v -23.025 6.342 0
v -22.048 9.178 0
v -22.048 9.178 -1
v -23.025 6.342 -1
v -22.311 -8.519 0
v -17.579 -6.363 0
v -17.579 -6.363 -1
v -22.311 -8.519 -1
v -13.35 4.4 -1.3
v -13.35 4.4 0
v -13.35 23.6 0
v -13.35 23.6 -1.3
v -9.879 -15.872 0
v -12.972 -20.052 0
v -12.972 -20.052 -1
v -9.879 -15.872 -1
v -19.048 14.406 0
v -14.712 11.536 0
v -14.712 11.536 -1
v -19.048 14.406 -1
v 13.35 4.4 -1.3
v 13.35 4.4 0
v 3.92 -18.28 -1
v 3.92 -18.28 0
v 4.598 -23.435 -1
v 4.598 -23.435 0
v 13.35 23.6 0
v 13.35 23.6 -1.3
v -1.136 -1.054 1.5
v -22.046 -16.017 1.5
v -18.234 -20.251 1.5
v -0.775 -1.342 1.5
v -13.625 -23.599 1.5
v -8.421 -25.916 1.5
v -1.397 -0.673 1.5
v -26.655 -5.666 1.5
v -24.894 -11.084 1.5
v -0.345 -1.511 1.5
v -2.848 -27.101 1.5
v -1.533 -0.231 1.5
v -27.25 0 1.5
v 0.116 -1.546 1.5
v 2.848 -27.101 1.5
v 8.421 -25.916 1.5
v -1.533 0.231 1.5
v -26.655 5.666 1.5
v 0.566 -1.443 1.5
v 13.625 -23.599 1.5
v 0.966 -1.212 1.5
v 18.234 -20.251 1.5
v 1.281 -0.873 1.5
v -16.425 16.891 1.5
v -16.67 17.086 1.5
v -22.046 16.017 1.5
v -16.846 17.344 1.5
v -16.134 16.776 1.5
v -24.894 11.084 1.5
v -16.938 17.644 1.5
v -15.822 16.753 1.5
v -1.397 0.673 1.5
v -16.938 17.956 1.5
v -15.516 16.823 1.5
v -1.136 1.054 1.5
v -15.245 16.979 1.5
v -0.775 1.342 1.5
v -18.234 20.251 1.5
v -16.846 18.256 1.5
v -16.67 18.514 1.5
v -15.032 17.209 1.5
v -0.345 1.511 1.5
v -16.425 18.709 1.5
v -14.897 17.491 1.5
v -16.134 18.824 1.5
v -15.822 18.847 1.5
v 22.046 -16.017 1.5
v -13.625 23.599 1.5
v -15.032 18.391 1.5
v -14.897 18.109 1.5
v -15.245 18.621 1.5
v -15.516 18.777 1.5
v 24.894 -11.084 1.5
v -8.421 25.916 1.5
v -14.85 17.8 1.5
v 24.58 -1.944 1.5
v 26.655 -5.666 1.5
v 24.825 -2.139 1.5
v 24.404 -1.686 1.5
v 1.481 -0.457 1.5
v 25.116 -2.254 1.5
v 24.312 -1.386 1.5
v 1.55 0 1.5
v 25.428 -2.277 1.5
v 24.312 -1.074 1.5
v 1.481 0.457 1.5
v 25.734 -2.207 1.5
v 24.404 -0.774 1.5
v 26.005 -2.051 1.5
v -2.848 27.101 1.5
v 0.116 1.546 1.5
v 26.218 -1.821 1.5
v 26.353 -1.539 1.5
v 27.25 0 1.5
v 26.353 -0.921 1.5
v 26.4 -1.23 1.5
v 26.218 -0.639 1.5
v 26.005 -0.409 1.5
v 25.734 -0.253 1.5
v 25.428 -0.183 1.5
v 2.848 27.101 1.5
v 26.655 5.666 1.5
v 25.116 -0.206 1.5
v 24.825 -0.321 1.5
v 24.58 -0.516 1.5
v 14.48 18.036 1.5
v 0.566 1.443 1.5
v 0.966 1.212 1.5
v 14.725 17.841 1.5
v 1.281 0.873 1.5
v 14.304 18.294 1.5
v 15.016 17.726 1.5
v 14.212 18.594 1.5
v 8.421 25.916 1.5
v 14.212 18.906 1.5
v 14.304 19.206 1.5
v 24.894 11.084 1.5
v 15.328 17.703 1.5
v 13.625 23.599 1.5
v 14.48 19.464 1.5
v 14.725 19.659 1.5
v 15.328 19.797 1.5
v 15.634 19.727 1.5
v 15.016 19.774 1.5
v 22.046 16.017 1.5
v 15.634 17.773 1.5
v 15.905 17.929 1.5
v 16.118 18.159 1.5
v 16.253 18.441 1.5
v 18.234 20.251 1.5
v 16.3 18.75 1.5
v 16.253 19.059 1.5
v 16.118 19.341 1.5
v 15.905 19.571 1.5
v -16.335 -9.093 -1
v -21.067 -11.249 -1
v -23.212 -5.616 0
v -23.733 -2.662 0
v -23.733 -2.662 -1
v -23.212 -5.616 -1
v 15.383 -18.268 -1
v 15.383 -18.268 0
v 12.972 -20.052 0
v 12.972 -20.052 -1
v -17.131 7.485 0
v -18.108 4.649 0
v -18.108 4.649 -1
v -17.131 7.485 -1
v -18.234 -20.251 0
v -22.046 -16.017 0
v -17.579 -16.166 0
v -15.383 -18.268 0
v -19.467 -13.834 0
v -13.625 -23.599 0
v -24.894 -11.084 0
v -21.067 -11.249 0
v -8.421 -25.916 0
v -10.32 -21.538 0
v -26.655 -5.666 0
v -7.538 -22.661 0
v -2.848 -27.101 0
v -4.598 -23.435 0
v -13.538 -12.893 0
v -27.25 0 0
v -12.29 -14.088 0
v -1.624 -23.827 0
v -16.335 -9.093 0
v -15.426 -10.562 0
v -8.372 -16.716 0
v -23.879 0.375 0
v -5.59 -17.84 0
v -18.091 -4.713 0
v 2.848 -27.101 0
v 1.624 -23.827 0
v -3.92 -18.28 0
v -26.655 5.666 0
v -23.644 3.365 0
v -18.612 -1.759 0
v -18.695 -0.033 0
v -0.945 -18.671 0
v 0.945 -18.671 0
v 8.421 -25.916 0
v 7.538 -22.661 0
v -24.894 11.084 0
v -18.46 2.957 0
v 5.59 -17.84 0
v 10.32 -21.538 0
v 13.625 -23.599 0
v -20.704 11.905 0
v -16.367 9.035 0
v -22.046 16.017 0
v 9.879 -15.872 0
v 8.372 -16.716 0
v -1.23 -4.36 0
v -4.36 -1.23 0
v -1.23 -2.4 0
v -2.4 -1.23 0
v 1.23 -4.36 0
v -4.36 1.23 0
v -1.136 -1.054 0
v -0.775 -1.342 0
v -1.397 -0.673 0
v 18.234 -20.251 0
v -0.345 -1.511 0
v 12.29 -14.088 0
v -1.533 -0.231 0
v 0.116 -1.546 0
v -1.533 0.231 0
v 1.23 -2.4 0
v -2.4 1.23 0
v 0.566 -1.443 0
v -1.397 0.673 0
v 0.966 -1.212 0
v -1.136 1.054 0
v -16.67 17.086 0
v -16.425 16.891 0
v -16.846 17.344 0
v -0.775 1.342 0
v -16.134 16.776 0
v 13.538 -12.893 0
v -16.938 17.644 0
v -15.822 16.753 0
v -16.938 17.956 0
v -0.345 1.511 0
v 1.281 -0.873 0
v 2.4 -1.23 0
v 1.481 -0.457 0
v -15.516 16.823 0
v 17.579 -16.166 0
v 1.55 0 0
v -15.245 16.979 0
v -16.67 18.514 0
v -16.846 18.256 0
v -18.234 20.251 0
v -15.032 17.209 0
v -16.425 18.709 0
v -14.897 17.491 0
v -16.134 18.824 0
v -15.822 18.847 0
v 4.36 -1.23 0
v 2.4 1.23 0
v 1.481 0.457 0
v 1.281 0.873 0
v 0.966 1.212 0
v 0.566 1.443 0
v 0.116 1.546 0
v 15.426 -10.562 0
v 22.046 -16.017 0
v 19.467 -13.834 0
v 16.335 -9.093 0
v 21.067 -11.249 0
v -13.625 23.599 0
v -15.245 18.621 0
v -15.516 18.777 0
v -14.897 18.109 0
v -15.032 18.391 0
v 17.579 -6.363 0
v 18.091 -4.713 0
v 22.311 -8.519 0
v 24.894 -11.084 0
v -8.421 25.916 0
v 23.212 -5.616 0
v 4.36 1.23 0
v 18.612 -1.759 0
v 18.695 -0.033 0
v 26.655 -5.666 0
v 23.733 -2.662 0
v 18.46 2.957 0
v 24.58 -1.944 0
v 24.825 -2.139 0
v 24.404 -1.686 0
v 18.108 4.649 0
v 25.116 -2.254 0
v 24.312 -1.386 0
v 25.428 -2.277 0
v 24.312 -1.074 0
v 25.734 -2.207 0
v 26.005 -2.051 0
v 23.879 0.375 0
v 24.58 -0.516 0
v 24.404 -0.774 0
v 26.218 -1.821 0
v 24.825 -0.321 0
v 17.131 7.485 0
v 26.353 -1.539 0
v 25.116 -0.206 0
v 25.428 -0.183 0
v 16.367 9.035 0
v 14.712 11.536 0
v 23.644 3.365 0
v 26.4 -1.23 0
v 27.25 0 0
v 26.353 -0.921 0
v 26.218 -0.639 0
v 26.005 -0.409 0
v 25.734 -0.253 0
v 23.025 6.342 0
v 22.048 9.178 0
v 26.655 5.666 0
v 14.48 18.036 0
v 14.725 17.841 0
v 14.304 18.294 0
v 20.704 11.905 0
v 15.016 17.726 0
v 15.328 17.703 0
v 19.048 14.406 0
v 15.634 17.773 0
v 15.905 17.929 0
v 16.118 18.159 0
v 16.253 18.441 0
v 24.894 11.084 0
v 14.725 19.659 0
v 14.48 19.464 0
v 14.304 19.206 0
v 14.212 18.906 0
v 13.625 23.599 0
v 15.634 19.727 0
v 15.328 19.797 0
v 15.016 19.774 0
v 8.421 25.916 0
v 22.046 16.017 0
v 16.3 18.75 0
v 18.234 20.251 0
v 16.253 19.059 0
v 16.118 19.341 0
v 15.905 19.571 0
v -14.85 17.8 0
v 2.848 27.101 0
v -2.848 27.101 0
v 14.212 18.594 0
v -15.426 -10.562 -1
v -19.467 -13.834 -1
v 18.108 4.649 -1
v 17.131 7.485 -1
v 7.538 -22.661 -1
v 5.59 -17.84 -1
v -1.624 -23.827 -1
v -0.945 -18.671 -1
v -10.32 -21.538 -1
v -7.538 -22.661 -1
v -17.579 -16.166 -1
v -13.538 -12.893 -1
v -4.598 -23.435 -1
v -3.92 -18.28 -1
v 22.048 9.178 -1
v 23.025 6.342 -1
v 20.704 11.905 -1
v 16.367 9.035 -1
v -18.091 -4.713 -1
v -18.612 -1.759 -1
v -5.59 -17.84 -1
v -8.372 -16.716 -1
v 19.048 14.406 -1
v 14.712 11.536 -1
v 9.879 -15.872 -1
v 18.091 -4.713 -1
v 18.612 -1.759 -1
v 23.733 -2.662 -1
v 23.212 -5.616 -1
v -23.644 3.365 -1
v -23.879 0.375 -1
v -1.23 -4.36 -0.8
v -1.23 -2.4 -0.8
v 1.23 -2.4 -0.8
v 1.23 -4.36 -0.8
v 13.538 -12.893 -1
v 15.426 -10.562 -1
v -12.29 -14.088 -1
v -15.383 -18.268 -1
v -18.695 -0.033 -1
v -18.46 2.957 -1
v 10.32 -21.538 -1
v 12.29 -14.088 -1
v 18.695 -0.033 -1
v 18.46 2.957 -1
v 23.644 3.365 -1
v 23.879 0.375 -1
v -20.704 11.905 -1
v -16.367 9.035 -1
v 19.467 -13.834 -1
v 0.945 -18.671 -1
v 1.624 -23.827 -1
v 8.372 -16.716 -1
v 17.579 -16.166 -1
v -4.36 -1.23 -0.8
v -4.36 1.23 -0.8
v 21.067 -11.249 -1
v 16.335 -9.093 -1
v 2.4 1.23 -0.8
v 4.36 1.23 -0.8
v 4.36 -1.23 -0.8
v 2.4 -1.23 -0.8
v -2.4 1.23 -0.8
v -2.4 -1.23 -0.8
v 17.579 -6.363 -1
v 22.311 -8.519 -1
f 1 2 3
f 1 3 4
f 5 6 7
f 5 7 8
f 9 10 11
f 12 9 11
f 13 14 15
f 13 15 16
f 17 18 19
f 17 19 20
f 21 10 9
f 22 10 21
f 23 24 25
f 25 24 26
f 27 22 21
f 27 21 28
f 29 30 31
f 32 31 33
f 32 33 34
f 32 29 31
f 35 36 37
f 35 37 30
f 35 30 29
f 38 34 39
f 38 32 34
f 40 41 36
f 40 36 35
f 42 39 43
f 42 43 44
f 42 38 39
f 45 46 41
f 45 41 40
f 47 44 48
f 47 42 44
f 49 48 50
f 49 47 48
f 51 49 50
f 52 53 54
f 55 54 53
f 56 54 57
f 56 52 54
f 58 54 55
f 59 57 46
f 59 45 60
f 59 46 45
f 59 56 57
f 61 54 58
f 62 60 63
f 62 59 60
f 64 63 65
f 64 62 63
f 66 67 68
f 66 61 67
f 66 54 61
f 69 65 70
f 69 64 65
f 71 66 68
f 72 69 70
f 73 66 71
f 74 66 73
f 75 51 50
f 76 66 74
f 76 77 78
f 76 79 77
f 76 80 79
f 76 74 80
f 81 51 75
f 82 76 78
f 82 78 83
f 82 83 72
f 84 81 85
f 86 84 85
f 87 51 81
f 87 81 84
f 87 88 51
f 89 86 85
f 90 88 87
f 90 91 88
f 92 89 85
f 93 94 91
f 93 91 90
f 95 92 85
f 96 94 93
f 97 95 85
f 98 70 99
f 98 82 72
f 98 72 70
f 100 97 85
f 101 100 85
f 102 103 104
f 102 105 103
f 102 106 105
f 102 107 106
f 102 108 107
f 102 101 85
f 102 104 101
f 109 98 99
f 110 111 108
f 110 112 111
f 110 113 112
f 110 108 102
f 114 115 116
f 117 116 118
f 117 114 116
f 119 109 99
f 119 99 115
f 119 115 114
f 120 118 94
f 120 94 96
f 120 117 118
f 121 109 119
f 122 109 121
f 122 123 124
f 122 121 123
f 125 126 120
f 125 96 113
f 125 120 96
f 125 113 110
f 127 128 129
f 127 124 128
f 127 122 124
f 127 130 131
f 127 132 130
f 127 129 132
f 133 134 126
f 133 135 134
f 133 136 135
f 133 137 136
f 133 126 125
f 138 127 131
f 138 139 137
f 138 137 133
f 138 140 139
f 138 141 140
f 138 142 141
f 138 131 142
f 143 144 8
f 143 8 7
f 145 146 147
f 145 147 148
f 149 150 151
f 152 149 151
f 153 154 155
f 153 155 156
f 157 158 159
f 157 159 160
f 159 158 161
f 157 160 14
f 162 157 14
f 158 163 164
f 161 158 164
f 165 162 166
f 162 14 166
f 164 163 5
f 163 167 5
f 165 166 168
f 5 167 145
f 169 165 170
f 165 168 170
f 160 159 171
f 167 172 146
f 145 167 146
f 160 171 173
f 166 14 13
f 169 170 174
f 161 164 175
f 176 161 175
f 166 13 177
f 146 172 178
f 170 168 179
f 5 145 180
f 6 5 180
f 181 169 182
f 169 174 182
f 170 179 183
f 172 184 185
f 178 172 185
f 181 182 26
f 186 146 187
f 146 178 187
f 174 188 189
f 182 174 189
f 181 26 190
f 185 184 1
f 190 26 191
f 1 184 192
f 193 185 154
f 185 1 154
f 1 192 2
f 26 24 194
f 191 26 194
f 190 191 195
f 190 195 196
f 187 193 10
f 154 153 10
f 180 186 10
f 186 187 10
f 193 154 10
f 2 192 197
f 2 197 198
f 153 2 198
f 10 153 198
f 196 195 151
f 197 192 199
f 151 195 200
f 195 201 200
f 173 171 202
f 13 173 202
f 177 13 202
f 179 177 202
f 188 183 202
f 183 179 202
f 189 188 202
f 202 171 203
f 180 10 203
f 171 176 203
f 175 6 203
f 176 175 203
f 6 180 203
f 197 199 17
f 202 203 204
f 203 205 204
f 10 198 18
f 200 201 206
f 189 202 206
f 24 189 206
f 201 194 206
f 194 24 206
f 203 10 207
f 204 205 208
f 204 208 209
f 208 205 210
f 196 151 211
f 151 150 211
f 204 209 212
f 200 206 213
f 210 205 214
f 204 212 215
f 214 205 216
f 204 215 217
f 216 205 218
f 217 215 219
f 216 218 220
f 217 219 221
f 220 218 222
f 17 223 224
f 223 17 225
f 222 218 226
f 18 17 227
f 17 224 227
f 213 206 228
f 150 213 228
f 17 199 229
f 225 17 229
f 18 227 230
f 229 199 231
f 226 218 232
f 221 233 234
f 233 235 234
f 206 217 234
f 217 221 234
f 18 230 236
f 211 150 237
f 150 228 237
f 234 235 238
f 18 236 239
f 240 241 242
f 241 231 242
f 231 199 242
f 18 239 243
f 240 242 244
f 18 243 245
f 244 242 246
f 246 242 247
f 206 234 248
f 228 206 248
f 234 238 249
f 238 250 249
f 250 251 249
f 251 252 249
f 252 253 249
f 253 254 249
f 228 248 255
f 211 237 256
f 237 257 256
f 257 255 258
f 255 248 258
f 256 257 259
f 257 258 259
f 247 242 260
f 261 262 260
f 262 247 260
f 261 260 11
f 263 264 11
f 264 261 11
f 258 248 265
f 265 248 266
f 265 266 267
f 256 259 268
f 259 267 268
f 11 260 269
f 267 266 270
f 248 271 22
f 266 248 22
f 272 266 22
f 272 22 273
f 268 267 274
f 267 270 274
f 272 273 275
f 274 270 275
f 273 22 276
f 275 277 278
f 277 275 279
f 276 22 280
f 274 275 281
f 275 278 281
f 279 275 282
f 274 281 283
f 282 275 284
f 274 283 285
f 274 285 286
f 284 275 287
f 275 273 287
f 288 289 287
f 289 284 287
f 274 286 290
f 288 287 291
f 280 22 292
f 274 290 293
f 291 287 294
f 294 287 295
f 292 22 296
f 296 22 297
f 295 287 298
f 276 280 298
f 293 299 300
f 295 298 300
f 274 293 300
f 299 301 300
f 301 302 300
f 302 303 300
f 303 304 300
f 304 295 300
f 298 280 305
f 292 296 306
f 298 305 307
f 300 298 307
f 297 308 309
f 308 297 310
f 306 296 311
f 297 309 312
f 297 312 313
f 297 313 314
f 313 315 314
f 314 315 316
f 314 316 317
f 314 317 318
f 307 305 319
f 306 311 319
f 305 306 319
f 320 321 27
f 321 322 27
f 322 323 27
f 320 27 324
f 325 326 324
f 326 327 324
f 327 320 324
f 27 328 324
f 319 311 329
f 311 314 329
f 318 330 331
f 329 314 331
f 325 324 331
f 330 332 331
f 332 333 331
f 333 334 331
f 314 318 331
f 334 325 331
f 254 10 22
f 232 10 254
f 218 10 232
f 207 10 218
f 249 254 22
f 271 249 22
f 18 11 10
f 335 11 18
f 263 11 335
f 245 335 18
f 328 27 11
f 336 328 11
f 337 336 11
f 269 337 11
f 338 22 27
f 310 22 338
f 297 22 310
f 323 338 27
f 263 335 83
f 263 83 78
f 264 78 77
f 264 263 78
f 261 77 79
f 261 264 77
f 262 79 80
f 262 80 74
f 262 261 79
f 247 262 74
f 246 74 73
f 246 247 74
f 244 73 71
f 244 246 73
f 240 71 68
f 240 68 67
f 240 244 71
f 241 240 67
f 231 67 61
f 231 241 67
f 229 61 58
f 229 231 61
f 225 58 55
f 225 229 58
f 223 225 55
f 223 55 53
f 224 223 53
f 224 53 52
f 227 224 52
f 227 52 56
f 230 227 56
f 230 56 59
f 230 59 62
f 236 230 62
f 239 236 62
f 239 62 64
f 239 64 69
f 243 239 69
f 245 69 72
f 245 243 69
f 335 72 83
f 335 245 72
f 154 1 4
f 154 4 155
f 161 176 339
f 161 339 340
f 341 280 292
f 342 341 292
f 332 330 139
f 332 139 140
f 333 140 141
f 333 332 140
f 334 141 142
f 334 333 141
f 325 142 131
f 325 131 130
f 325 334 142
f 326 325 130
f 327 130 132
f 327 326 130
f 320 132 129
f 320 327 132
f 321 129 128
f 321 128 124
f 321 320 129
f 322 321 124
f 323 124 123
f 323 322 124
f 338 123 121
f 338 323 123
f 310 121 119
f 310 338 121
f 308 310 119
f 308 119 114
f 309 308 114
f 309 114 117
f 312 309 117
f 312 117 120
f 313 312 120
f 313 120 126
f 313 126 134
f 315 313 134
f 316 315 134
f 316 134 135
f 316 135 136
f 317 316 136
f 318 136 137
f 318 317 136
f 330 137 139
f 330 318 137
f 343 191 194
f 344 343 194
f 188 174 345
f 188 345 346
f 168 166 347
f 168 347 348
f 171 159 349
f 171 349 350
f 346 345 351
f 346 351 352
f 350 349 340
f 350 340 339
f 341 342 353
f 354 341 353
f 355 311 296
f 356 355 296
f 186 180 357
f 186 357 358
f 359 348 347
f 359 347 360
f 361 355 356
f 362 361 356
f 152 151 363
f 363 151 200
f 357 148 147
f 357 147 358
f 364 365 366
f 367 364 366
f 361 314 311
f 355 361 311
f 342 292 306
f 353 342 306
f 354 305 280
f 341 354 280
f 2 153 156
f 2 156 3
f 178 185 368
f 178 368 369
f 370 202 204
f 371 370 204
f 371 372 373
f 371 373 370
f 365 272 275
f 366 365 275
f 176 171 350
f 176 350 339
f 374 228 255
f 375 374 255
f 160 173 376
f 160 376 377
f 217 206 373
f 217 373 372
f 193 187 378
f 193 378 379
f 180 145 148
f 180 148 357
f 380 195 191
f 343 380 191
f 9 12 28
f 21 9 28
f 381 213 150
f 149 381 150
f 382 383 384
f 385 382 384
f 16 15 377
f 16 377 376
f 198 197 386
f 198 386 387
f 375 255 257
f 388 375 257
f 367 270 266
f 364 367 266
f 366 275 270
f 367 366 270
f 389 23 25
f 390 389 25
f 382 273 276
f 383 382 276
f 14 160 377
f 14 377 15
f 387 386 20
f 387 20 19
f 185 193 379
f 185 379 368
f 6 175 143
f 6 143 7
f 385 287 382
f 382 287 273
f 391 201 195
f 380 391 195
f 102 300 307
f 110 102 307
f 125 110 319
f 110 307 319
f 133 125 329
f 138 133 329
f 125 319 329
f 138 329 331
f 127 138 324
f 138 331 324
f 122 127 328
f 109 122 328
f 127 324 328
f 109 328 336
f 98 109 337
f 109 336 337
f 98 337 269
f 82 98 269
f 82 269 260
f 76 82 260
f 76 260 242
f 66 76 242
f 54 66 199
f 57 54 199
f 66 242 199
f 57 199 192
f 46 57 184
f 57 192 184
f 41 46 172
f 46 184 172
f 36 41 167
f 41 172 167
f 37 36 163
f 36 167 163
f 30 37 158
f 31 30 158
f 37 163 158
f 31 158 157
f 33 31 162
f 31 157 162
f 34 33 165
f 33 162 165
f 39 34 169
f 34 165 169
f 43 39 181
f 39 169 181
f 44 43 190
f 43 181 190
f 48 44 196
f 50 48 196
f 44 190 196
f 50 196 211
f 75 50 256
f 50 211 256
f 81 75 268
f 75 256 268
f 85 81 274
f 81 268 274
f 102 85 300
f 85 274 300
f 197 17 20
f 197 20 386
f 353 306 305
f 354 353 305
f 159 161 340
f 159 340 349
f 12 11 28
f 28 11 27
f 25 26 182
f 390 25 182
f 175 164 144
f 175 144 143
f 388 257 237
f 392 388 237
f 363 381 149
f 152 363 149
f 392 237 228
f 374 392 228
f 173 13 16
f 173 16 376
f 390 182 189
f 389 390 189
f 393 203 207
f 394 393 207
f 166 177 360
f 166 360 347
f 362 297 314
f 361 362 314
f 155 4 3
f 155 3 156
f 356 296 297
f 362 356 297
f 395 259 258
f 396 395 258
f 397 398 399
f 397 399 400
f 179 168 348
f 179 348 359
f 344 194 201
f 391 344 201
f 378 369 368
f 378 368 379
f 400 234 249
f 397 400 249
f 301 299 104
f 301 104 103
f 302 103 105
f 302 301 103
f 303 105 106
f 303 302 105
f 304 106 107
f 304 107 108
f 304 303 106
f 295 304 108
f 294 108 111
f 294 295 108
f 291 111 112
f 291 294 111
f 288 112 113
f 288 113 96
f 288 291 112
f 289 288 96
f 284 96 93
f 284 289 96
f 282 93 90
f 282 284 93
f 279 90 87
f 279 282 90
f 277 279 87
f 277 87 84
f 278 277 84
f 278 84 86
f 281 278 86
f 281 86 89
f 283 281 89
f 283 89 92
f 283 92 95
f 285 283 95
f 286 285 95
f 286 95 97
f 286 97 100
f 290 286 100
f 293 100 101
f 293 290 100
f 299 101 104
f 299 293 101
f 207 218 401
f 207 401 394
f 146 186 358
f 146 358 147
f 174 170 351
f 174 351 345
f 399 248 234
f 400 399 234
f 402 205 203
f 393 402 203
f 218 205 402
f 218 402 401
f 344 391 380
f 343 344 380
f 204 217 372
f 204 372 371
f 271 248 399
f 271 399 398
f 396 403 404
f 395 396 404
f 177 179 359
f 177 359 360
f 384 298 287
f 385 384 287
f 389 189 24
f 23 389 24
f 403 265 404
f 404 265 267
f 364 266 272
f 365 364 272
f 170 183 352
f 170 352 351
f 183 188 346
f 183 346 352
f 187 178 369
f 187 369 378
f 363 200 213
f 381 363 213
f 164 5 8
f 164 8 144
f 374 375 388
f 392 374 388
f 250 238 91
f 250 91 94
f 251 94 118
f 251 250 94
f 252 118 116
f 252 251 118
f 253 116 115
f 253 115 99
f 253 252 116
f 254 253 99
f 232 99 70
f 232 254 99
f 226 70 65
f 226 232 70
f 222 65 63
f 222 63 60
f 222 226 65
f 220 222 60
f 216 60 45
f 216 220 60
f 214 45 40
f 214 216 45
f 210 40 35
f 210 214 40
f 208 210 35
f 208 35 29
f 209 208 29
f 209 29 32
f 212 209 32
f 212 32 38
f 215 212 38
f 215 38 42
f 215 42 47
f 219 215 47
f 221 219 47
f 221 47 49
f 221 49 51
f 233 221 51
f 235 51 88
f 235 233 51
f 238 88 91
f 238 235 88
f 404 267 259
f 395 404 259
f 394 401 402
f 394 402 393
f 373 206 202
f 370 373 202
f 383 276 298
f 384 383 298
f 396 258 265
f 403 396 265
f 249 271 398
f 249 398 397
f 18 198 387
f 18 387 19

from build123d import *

# Parameters (mm, degrees)
SKETCH_1_R           = 27.25
SKETCH_1_R_2         = 1.05
SKETCH_1_R_3         = 1.55
EXTRUDE_1_DEPTH      = 1.5
SKETCH_2_W           = 26.7
SKETCH_2_H           = 19.2
EXTRUDE_2_DEPTH      = 1.3
BOSS_EXTRUDE1_DEPTH  = 1
CIRPATTERN1_COUNT    = 9
CIRPATTERN1_ANGLE    = 116
SKETCH2_W            = 2.46
SKETCH2_H            = 1.96
SKETCH2_W_2          = 1.96
SKETCH2_H_2          = 2.46
BOSS_EXTRUDE2_DEPTH  = 0.8
MIRROR1_COPY_1_DEPTH = 1
MIRROR1_COPY_2_DEPTH = 1
MIRROR1_COPY_3_DEPTH = 1
MIRROR1_COPY_4_DEPTH = 1
MIRROR1_COPY_5_DEPTH = 1
MIRROR1_COPY_6_DEPTH = 1
MIRROR1_COPY_7_DEPTH = 1
MIRROR1_COPY_8_DEPTH = 1


with BuildPart() as part:
    # Эскиз1 → Бобышка-Вытянуть1 (new body)
    with BuildSketch(Plane.XY):
        Circle(SKETCH_1_R)
        with Locations((-15.9, 17.8)):
            Circle(SKETCH_1_R_2, mode=Mode.SUBTRACT)
        with Locations((15.25, 18.75)):
            Circle(SKETCH_1_R_2, mode=Mode.SUBTRACT)
        with Locations((25.35, -1.23)):
            Circle(SKETCH_1_R_2, mode=Mode.SUBTRACT)
        Circle(SKETCH_1_R_3, mode=Mode.SUBTRACT)
    extrude(amount=EXTRUDE_1_DEPTH)

    # Эскиз2 → Бобышка-Вытянуть2 (add)
    with BuildSketch(Plane.XY):
        with Locations((0, 14)):
            Rectangle(SKETCH_2_W, SKETCH_2_H)
    extrude(amount=-EXTRUDE_2_DEPTH)

    # Sketch1 → Boss-Extrude1 (add)
    with BuildSketch(Plane(origin=(0, 0, 0), x_dir=(-1, 0, 0), z_dir=(0, 0, -1))):
        Polygon((19.047763091, 14.406246778), (20.703574047, 11.904589312), (16.367367772, 9.034516988), (14.711556816, 11.536174454), align=None)
    boss_extrude1 = extrude(amount=BOSS_EXTRUDE1_DEPTH)

    # CirPattern1: Boss-Extrude1 ×9 about axis
    cirpattern1_axis = Axis((0, 0, 0), (0, 0, 1))
    for i in range(1, CIRPATTERN1_COUNT):
        add(boss_extrude1.rotate(cirpattern1_axis, i * CIRPATTERN1_ANGLE / (CIRPATTERN1_COUNT - 1)))

    # Sketch2 → Boss-Extrude2 (add)
    with BuildSketch(Plane(origin=(0, 0, 0), x_dir=(-1, 0, 0), z_dir=(0, 0, -1))):
        with Locations((0, -3.38)):
            Rectangle(SKETCH2_W, SKETCH2_H)
        with Locations((-3.38, 0)):
            Rectangle(SKETCH2_W_2, SKETCH2_H_2)
        with Locations((3.38, 0)):
            Rectangle(SKETCH2_W_2, SKETCH2_H_2)
    extrude(amount=BOSS_EXTRUDE2_DEPTH)

    # Mirror1: Boss-Extrude1 across plane
    add(boss_extrude1.mirror(Plane(origin=(0, 0, 0), x_dir=(0, 0, 1), z_dir=(1, 0, 0))))

    # Mirror1 copy 1 sketch → Mirror1 copy 1 (add)
    with BuildSketch(Plane(origin=(0, 0, 0), x_dir=(0.9681476403781076, -0.25038000405444194, 0), z_dir=(0, 0, -1))):
        Polygon((19.047763091, -14.406246778), (20.703574047, -11.904589312), (16.367367772, -9.034516988), (14.711556816, -11.536174454), align=None)
    extrude(amount=MIRROR1_COPY_1_DEPTH)

    # Mirror1 copy 2 sketch → Mirror1 copy 2 (add)
    with BuildSketch(Plane(origin=(0, 0, 0), x_dir=(0.8746197071393953, -0.484809620246338, 0), z_dir=(0, 0, -1))):
        Polygon((19.047763091, -14.406246778), (20.703574047, -11.904589312), (16.367367772, -9.034516988), (14.711556816, -11.536174454), align=None)
    extrude(amount=MIRROR1_COPY_2_DEPTH)

    # Mirror1 copy 3 sketch → Mirror1 copy 3 (add)
    with BuildSketch(Plane(origin=(0, 0, 0), x_dir=(0.7253743710122864, -0.6883545756937552, 0), z_dir=(0, 0, -1))):
        Polygon((19.047763091, -14.406246778), (20.703574047, -11.904589312), (16.367367772, -9.034516988), (14.711556816, -11.536174454), align=None)
    extrude(amount=MIRROR1_COPY_3_DEPTH)

    # Mirror1 copy 4 sketch → Mirror1 copy 4 (add)
    with BuildSketch(Plane(origin=(0, 0, 0), x_dir=(0.529919264233203, -0.8480480961564272, 0), z_dir=(0, 0, -1))):
        Polygon((19.047763091, -14.406246778), (20.703574047, -11.904589312), (16.367367772, -9.034516988), (14.711556816, -11.536174454), align=None)
    extrude(amount=MIRROR1_COPY_4_DEPTH)

    # Mirror1 copy 5 sketch → Mirror1 copy 5 (add)
    with BuildSketch(Plane(origin=(0, 0, 0), x_dir=(0.3007057995042705, -0.9537169507482277, 0), z_dir=(0, 0, -1))):
        Polygon((19.047763091, -14.406246778), (20.703574047, -11.904589312), (16.367367772, -9.034516988), (14.711556816, -11.536174454), align=None)
    extrude(amount=MIRROR1_COPY_5_DEPTH)

    # Mirror1 copy 6 sketch → Mirror1 copy 6 (add)
    with BuildSketch(Plane(origin=(0, 0, 0), x_dir=(0.05233595624294042, -0.998629534754574, 0), z_dir=(0, 0, -1))):
        Polygon((19.047763091, -14.406246778), (20.703574047, -11.904589312), (16.367367772, -9.034516988), (14.711556816, -11.536174454), align=None)
    extrude(amount=MIRROR1_COPY_6_DEPTH)

    # Mirror1 copy 7 sketch → Mirror1 copy 7 (add)
    with BuildSketch(Plane(origin=(0, 0, 0), x_dir=(-0.199367934417201, -0.9799247046208288, 0), z_dir=(0, 0, -1))):
        Polygon((19.047763091, -14.406246778), (20.703574047, -11.904589312), (16.367367772, -9.034516988), (14.711556816, -11.536174454), align=None)
    extrude(amount=MIRROR1_COPY_7_DEPTH)

    # Mirror1 copy 8 sketch → Mirror1 copy 8 (add)
    with BuildSketch(Plane(origin=(0, 0, 0), x_dir=(-0.4383711467890815, -0.898794046299165, 0), z_dir=(0, 0, -1))):
        Polygon((19.047763091, -14.406246778), (20.703574047, -11.904589312), (16.367367772, -9.034516988), (14.711556816, -11.536174454), align=None)
    extrude(amount=MIRROR1_COPY_8_DEPTH)


solid = part.part
